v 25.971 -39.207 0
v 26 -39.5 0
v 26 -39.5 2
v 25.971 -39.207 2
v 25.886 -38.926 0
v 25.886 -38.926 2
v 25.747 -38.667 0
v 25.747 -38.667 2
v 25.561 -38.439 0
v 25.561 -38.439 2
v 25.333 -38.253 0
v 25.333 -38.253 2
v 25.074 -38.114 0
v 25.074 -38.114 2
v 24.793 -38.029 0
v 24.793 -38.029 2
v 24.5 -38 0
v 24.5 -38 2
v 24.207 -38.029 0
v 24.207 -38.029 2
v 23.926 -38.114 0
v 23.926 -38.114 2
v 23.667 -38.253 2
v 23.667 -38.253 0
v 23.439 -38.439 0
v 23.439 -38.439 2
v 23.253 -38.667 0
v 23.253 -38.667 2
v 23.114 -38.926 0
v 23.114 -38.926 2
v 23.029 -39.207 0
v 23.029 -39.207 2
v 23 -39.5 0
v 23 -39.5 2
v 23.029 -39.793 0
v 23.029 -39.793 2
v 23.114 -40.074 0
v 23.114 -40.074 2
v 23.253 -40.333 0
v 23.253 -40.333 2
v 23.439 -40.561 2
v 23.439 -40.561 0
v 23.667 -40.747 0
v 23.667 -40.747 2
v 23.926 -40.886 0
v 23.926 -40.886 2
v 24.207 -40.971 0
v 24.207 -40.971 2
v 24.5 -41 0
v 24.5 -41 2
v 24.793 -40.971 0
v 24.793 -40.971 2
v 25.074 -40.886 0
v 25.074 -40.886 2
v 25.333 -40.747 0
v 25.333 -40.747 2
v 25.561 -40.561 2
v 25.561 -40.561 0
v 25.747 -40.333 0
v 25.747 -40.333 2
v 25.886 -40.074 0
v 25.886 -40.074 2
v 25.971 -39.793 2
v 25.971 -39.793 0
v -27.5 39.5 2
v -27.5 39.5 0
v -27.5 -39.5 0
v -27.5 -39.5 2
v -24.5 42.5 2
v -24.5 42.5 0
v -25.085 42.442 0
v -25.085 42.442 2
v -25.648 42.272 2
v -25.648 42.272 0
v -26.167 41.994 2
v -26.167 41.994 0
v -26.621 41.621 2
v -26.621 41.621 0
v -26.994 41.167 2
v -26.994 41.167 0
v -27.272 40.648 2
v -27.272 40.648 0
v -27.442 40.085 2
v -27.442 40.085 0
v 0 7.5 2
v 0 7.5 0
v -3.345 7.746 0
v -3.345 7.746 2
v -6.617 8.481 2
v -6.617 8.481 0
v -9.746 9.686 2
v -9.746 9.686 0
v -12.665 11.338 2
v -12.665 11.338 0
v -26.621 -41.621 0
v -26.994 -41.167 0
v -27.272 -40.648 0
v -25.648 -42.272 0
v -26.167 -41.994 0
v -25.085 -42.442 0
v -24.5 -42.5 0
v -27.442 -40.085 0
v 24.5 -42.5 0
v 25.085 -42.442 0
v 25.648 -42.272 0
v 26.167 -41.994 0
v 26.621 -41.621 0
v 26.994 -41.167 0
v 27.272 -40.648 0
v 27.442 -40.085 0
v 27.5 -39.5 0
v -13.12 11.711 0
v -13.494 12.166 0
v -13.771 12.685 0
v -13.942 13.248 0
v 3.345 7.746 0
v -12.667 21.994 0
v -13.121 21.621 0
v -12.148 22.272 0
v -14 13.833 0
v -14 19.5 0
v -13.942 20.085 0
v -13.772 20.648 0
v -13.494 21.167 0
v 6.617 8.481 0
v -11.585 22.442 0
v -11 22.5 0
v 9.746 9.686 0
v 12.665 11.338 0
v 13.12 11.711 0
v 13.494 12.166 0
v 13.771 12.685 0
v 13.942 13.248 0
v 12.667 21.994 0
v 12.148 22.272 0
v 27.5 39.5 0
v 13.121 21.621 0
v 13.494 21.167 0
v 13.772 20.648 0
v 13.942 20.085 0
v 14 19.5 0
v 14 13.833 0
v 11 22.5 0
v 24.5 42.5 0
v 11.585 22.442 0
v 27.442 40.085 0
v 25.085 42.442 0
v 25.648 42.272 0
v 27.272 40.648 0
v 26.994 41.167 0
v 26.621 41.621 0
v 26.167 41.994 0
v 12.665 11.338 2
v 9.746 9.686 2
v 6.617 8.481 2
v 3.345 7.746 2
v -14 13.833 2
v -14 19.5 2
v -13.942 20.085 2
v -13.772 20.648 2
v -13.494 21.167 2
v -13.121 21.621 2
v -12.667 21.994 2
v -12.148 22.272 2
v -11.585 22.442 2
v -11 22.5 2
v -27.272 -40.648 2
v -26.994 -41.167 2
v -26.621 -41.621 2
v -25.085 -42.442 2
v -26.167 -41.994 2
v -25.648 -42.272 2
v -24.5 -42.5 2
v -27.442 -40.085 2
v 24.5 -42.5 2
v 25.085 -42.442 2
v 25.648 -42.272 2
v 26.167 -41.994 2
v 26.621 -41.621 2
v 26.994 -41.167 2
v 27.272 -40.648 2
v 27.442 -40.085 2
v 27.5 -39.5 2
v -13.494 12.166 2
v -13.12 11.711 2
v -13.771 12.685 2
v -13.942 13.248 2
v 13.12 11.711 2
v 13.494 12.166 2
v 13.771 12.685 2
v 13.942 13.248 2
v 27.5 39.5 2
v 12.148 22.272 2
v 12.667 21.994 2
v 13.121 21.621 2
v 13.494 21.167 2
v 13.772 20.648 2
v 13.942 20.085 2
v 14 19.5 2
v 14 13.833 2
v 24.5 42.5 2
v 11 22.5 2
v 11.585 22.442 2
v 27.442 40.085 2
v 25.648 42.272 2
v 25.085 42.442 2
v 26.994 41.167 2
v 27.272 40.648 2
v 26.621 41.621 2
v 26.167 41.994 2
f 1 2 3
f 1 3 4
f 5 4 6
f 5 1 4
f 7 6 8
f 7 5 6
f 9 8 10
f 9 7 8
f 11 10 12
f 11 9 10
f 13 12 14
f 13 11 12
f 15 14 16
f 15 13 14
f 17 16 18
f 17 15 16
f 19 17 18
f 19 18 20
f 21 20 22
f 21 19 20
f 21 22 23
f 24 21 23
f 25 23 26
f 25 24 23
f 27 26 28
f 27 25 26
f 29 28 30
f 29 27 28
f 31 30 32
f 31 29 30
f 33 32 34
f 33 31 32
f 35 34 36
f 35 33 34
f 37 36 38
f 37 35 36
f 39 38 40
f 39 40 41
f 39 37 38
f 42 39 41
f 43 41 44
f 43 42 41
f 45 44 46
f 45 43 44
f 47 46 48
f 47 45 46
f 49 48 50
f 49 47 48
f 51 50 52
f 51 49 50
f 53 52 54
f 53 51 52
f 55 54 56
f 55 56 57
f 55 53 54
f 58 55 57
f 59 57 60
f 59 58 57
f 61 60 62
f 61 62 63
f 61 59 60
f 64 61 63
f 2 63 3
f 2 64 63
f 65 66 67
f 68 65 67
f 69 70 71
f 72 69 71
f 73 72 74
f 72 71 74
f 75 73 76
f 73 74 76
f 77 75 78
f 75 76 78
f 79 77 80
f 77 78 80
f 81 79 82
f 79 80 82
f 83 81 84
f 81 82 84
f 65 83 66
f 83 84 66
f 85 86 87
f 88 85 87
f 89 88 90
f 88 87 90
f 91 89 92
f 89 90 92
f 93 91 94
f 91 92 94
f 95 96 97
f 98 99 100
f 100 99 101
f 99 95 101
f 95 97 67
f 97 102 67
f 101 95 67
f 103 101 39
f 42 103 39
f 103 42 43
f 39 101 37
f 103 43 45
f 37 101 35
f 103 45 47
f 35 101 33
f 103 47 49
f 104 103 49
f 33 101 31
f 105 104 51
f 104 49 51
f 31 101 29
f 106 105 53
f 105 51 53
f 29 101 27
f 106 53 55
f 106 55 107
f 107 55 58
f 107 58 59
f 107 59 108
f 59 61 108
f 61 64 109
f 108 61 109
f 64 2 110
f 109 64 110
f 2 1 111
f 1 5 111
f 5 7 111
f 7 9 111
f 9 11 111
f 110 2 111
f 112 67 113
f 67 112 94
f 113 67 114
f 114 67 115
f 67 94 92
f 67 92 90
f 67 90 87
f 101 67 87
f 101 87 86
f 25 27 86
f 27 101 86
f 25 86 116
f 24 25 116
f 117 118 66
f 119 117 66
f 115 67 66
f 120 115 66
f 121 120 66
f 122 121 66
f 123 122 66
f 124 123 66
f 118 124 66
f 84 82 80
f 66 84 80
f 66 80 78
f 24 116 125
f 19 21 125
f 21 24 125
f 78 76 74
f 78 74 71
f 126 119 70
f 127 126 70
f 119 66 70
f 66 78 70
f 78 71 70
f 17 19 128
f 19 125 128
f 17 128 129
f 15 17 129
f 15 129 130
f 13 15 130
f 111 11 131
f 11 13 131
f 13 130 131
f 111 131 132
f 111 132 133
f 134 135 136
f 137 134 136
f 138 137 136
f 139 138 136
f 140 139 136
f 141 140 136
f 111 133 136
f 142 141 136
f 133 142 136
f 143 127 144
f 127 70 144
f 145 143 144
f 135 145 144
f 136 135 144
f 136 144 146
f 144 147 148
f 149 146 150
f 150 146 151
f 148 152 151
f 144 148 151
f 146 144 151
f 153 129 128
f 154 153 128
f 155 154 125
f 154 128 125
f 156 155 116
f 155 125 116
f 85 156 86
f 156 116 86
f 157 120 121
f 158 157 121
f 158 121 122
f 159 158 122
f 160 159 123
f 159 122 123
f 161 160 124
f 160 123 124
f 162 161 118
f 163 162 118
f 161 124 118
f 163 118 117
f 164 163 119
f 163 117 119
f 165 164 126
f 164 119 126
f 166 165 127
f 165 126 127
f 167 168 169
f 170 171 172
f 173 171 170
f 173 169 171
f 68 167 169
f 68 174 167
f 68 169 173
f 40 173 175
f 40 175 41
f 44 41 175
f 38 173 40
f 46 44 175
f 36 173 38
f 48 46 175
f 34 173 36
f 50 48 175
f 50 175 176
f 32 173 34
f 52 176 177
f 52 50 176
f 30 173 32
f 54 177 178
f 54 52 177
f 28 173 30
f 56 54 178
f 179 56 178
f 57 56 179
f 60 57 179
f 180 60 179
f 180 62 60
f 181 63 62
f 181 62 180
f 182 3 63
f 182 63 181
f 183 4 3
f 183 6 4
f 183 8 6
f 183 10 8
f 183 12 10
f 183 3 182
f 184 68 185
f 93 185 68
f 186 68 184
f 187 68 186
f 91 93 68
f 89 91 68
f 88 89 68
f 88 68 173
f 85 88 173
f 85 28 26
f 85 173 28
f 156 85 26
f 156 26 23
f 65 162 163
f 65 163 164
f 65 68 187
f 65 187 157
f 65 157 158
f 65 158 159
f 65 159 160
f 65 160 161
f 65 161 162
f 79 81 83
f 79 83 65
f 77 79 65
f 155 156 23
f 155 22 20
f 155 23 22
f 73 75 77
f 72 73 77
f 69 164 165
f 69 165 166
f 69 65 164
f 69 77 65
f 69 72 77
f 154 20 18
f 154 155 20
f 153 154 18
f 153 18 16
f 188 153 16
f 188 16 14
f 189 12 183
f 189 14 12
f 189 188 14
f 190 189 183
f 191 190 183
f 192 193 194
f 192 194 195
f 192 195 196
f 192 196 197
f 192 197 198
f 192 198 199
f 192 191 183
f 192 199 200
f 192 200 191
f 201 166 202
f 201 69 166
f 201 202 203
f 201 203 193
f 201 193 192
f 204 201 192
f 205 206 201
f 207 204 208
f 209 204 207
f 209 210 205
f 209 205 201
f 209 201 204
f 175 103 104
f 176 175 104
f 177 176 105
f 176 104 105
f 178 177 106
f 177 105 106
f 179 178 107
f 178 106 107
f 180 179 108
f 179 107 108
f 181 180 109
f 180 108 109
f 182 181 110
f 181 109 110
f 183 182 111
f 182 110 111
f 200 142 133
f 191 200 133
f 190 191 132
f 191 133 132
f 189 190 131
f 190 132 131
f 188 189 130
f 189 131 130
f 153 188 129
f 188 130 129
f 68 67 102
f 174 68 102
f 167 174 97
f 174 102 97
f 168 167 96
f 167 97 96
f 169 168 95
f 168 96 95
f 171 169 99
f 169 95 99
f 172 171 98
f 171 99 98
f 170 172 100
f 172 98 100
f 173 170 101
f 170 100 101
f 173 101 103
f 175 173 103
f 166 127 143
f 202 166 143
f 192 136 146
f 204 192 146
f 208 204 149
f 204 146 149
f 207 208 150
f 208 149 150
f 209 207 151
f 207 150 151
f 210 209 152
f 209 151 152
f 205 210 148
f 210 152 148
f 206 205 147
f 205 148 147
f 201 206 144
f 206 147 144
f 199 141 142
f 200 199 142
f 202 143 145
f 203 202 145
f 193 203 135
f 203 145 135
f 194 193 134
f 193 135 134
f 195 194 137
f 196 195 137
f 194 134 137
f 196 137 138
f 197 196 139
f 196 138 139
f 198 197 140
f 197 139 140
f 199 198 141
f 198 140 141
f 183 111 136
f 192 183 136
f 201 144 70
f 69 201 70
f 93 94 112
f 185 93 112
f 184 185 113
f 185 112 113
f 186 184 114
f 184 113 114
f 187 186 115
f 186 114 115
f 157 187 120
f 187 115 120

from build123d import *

# Parameters (mm, degrees)
F0_R     = 1.5
F1_DEPTH = 2


with BuildPart() as f1:
    # F0 (on Top) → F1 (new body)
    with BuildSketch(Plane.XY):
        with BuildLine():
            ThreePointArc((27.5, 39.5), (26.62132, 41.62132), (24.5, 42.5))
            Line((24.5, 42.5), (-24.5, 42.5))
            ThreePointArc((-24.5, 42.5), (-26.62132, 41.62132), (-27.5, 39.5))
            Line((-27.5, 39.5), (-27.5, -39.5))
            ThreePointArc((-27.5, -39.5), (-26.62132, -41.62132), (-24.5, -42.5))
            Line((-24.5, -42.5), (24.5, -42.5))
            ThreePointArc((24.5, -42.5), (26.62132, -41.62132), (27.5, -39.5))
            Line((27.5, -39.5), (27.5, 39.5))
        make_face()
        with Locations((24.5, -39.5)):
            Circle(F0_R, mode=Mode.SUBTRACT)
        with BuildLine():
            Line((14, 19.5), (14, 13.833333))
            ThreePointArc((14, 13.833333), (13.645354, 12.418377), (12.665265, 11.337959))
            ThreePointArc((12.665265, 11.337959), (6.617002, 8.48056), (0, 7.5))
            ThreePointArc((0, 7.5), (-6.617002, 8.48056), (-12.665265, 11.337959))
            ThreePointArc((-12.665265, 11.337959), (-13.645354, 12.418377), (-14, 13.833333))
            Line((-14, 13.833333), (-14, 19.5))
            ThreePointArc((-14, 19.5), (-13.12132, 21.62132), (-11, 22.5))
            Line((-11, 22.5), (0, 22.5))
            Line((0, 22.5), (11, 22.5))
            ThreePointArc((11, 22.5), (13.12132, 21.62132), (14, 19.5))
        make_face(mode=Mode.SUBTRACT)
    extrude(amount=F1_DEPTH)


solid = f1.part
